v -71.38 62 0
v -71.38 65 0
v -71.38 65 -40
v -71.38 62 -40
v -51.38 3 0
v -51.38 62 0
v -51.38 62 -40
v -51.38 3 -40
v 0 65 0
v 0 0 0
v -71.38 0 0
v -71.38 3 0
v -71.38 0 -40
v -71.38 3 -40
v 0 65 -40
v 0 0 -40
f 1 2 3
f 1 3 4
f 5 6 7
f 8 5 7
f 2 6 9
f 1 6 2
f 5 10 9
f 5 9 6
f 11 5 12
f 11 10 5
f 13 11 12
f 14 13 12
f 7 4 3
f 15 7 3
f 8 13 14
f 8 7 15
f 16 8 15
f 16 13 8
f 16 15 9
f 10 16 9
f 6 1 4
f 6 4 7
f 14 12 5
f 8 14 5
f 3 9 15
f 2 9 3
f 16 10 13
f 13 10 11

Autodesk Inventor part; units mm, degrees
ref_plane "YZ Plane" through (0, 0, 0) normal (1, 0, 0) x (0, 1, 0)
ref_plane "XZ Plane" through (0, 0, 0) normal (0, 1, 0) x (-1, 0, 0)
ref_plane "XY Plane" through (0, 0, 0) normal (0, 0, 1) x (1, 0, 0)
sketch "Sketch1" plane through (0, 0, 0) normal (0, 1, 0) x (-1, 0, 0)
  line L0 (0, 0) -> (51.38, 0)
  line L1 (51.38, 0) -> (51.38, -40)
  line L2 (51.38, -40) -> (0, -40)
  line L3 (0, -40) -> (0, 0)
  dimension "d0" = 51.38
  dimension "d1" = 40
extrude "Extrusion1" add sketch "Sketch1" along normal blind 65
sketch "Sketch2" plane through (-51.38, 0, 0) normal (0, 0, 1) x (1, 0, 0)
  line L0 (51.38, 0) -> (0, 0) projected
  line L1 (0, 0) -> (-20, 0)
  line L2 (-20, 0) -> (-20, 3)
  line L3 (-20, 3) -> (0, 3)
  line L4 (0, 3) -> (0, 0)
  line L5 (51.38, 65) -> (0, 65) projected
  line L6 (0, 65) -> (-20, 65)
  line L7 (-20, 65) -> (-20, 62)
  line L8 (-20, 62) -> (0, 62)
  line L9 (0, 62) -> (0, 65)
  dimension "d4" = 20
  dimension "d5" = 3
  dimension "d6" = 20
  dimension "d7" = 3
extrude "Extrusion2" add sketch "Sketch2" against normal blind 40
properties part number "motor_support"
